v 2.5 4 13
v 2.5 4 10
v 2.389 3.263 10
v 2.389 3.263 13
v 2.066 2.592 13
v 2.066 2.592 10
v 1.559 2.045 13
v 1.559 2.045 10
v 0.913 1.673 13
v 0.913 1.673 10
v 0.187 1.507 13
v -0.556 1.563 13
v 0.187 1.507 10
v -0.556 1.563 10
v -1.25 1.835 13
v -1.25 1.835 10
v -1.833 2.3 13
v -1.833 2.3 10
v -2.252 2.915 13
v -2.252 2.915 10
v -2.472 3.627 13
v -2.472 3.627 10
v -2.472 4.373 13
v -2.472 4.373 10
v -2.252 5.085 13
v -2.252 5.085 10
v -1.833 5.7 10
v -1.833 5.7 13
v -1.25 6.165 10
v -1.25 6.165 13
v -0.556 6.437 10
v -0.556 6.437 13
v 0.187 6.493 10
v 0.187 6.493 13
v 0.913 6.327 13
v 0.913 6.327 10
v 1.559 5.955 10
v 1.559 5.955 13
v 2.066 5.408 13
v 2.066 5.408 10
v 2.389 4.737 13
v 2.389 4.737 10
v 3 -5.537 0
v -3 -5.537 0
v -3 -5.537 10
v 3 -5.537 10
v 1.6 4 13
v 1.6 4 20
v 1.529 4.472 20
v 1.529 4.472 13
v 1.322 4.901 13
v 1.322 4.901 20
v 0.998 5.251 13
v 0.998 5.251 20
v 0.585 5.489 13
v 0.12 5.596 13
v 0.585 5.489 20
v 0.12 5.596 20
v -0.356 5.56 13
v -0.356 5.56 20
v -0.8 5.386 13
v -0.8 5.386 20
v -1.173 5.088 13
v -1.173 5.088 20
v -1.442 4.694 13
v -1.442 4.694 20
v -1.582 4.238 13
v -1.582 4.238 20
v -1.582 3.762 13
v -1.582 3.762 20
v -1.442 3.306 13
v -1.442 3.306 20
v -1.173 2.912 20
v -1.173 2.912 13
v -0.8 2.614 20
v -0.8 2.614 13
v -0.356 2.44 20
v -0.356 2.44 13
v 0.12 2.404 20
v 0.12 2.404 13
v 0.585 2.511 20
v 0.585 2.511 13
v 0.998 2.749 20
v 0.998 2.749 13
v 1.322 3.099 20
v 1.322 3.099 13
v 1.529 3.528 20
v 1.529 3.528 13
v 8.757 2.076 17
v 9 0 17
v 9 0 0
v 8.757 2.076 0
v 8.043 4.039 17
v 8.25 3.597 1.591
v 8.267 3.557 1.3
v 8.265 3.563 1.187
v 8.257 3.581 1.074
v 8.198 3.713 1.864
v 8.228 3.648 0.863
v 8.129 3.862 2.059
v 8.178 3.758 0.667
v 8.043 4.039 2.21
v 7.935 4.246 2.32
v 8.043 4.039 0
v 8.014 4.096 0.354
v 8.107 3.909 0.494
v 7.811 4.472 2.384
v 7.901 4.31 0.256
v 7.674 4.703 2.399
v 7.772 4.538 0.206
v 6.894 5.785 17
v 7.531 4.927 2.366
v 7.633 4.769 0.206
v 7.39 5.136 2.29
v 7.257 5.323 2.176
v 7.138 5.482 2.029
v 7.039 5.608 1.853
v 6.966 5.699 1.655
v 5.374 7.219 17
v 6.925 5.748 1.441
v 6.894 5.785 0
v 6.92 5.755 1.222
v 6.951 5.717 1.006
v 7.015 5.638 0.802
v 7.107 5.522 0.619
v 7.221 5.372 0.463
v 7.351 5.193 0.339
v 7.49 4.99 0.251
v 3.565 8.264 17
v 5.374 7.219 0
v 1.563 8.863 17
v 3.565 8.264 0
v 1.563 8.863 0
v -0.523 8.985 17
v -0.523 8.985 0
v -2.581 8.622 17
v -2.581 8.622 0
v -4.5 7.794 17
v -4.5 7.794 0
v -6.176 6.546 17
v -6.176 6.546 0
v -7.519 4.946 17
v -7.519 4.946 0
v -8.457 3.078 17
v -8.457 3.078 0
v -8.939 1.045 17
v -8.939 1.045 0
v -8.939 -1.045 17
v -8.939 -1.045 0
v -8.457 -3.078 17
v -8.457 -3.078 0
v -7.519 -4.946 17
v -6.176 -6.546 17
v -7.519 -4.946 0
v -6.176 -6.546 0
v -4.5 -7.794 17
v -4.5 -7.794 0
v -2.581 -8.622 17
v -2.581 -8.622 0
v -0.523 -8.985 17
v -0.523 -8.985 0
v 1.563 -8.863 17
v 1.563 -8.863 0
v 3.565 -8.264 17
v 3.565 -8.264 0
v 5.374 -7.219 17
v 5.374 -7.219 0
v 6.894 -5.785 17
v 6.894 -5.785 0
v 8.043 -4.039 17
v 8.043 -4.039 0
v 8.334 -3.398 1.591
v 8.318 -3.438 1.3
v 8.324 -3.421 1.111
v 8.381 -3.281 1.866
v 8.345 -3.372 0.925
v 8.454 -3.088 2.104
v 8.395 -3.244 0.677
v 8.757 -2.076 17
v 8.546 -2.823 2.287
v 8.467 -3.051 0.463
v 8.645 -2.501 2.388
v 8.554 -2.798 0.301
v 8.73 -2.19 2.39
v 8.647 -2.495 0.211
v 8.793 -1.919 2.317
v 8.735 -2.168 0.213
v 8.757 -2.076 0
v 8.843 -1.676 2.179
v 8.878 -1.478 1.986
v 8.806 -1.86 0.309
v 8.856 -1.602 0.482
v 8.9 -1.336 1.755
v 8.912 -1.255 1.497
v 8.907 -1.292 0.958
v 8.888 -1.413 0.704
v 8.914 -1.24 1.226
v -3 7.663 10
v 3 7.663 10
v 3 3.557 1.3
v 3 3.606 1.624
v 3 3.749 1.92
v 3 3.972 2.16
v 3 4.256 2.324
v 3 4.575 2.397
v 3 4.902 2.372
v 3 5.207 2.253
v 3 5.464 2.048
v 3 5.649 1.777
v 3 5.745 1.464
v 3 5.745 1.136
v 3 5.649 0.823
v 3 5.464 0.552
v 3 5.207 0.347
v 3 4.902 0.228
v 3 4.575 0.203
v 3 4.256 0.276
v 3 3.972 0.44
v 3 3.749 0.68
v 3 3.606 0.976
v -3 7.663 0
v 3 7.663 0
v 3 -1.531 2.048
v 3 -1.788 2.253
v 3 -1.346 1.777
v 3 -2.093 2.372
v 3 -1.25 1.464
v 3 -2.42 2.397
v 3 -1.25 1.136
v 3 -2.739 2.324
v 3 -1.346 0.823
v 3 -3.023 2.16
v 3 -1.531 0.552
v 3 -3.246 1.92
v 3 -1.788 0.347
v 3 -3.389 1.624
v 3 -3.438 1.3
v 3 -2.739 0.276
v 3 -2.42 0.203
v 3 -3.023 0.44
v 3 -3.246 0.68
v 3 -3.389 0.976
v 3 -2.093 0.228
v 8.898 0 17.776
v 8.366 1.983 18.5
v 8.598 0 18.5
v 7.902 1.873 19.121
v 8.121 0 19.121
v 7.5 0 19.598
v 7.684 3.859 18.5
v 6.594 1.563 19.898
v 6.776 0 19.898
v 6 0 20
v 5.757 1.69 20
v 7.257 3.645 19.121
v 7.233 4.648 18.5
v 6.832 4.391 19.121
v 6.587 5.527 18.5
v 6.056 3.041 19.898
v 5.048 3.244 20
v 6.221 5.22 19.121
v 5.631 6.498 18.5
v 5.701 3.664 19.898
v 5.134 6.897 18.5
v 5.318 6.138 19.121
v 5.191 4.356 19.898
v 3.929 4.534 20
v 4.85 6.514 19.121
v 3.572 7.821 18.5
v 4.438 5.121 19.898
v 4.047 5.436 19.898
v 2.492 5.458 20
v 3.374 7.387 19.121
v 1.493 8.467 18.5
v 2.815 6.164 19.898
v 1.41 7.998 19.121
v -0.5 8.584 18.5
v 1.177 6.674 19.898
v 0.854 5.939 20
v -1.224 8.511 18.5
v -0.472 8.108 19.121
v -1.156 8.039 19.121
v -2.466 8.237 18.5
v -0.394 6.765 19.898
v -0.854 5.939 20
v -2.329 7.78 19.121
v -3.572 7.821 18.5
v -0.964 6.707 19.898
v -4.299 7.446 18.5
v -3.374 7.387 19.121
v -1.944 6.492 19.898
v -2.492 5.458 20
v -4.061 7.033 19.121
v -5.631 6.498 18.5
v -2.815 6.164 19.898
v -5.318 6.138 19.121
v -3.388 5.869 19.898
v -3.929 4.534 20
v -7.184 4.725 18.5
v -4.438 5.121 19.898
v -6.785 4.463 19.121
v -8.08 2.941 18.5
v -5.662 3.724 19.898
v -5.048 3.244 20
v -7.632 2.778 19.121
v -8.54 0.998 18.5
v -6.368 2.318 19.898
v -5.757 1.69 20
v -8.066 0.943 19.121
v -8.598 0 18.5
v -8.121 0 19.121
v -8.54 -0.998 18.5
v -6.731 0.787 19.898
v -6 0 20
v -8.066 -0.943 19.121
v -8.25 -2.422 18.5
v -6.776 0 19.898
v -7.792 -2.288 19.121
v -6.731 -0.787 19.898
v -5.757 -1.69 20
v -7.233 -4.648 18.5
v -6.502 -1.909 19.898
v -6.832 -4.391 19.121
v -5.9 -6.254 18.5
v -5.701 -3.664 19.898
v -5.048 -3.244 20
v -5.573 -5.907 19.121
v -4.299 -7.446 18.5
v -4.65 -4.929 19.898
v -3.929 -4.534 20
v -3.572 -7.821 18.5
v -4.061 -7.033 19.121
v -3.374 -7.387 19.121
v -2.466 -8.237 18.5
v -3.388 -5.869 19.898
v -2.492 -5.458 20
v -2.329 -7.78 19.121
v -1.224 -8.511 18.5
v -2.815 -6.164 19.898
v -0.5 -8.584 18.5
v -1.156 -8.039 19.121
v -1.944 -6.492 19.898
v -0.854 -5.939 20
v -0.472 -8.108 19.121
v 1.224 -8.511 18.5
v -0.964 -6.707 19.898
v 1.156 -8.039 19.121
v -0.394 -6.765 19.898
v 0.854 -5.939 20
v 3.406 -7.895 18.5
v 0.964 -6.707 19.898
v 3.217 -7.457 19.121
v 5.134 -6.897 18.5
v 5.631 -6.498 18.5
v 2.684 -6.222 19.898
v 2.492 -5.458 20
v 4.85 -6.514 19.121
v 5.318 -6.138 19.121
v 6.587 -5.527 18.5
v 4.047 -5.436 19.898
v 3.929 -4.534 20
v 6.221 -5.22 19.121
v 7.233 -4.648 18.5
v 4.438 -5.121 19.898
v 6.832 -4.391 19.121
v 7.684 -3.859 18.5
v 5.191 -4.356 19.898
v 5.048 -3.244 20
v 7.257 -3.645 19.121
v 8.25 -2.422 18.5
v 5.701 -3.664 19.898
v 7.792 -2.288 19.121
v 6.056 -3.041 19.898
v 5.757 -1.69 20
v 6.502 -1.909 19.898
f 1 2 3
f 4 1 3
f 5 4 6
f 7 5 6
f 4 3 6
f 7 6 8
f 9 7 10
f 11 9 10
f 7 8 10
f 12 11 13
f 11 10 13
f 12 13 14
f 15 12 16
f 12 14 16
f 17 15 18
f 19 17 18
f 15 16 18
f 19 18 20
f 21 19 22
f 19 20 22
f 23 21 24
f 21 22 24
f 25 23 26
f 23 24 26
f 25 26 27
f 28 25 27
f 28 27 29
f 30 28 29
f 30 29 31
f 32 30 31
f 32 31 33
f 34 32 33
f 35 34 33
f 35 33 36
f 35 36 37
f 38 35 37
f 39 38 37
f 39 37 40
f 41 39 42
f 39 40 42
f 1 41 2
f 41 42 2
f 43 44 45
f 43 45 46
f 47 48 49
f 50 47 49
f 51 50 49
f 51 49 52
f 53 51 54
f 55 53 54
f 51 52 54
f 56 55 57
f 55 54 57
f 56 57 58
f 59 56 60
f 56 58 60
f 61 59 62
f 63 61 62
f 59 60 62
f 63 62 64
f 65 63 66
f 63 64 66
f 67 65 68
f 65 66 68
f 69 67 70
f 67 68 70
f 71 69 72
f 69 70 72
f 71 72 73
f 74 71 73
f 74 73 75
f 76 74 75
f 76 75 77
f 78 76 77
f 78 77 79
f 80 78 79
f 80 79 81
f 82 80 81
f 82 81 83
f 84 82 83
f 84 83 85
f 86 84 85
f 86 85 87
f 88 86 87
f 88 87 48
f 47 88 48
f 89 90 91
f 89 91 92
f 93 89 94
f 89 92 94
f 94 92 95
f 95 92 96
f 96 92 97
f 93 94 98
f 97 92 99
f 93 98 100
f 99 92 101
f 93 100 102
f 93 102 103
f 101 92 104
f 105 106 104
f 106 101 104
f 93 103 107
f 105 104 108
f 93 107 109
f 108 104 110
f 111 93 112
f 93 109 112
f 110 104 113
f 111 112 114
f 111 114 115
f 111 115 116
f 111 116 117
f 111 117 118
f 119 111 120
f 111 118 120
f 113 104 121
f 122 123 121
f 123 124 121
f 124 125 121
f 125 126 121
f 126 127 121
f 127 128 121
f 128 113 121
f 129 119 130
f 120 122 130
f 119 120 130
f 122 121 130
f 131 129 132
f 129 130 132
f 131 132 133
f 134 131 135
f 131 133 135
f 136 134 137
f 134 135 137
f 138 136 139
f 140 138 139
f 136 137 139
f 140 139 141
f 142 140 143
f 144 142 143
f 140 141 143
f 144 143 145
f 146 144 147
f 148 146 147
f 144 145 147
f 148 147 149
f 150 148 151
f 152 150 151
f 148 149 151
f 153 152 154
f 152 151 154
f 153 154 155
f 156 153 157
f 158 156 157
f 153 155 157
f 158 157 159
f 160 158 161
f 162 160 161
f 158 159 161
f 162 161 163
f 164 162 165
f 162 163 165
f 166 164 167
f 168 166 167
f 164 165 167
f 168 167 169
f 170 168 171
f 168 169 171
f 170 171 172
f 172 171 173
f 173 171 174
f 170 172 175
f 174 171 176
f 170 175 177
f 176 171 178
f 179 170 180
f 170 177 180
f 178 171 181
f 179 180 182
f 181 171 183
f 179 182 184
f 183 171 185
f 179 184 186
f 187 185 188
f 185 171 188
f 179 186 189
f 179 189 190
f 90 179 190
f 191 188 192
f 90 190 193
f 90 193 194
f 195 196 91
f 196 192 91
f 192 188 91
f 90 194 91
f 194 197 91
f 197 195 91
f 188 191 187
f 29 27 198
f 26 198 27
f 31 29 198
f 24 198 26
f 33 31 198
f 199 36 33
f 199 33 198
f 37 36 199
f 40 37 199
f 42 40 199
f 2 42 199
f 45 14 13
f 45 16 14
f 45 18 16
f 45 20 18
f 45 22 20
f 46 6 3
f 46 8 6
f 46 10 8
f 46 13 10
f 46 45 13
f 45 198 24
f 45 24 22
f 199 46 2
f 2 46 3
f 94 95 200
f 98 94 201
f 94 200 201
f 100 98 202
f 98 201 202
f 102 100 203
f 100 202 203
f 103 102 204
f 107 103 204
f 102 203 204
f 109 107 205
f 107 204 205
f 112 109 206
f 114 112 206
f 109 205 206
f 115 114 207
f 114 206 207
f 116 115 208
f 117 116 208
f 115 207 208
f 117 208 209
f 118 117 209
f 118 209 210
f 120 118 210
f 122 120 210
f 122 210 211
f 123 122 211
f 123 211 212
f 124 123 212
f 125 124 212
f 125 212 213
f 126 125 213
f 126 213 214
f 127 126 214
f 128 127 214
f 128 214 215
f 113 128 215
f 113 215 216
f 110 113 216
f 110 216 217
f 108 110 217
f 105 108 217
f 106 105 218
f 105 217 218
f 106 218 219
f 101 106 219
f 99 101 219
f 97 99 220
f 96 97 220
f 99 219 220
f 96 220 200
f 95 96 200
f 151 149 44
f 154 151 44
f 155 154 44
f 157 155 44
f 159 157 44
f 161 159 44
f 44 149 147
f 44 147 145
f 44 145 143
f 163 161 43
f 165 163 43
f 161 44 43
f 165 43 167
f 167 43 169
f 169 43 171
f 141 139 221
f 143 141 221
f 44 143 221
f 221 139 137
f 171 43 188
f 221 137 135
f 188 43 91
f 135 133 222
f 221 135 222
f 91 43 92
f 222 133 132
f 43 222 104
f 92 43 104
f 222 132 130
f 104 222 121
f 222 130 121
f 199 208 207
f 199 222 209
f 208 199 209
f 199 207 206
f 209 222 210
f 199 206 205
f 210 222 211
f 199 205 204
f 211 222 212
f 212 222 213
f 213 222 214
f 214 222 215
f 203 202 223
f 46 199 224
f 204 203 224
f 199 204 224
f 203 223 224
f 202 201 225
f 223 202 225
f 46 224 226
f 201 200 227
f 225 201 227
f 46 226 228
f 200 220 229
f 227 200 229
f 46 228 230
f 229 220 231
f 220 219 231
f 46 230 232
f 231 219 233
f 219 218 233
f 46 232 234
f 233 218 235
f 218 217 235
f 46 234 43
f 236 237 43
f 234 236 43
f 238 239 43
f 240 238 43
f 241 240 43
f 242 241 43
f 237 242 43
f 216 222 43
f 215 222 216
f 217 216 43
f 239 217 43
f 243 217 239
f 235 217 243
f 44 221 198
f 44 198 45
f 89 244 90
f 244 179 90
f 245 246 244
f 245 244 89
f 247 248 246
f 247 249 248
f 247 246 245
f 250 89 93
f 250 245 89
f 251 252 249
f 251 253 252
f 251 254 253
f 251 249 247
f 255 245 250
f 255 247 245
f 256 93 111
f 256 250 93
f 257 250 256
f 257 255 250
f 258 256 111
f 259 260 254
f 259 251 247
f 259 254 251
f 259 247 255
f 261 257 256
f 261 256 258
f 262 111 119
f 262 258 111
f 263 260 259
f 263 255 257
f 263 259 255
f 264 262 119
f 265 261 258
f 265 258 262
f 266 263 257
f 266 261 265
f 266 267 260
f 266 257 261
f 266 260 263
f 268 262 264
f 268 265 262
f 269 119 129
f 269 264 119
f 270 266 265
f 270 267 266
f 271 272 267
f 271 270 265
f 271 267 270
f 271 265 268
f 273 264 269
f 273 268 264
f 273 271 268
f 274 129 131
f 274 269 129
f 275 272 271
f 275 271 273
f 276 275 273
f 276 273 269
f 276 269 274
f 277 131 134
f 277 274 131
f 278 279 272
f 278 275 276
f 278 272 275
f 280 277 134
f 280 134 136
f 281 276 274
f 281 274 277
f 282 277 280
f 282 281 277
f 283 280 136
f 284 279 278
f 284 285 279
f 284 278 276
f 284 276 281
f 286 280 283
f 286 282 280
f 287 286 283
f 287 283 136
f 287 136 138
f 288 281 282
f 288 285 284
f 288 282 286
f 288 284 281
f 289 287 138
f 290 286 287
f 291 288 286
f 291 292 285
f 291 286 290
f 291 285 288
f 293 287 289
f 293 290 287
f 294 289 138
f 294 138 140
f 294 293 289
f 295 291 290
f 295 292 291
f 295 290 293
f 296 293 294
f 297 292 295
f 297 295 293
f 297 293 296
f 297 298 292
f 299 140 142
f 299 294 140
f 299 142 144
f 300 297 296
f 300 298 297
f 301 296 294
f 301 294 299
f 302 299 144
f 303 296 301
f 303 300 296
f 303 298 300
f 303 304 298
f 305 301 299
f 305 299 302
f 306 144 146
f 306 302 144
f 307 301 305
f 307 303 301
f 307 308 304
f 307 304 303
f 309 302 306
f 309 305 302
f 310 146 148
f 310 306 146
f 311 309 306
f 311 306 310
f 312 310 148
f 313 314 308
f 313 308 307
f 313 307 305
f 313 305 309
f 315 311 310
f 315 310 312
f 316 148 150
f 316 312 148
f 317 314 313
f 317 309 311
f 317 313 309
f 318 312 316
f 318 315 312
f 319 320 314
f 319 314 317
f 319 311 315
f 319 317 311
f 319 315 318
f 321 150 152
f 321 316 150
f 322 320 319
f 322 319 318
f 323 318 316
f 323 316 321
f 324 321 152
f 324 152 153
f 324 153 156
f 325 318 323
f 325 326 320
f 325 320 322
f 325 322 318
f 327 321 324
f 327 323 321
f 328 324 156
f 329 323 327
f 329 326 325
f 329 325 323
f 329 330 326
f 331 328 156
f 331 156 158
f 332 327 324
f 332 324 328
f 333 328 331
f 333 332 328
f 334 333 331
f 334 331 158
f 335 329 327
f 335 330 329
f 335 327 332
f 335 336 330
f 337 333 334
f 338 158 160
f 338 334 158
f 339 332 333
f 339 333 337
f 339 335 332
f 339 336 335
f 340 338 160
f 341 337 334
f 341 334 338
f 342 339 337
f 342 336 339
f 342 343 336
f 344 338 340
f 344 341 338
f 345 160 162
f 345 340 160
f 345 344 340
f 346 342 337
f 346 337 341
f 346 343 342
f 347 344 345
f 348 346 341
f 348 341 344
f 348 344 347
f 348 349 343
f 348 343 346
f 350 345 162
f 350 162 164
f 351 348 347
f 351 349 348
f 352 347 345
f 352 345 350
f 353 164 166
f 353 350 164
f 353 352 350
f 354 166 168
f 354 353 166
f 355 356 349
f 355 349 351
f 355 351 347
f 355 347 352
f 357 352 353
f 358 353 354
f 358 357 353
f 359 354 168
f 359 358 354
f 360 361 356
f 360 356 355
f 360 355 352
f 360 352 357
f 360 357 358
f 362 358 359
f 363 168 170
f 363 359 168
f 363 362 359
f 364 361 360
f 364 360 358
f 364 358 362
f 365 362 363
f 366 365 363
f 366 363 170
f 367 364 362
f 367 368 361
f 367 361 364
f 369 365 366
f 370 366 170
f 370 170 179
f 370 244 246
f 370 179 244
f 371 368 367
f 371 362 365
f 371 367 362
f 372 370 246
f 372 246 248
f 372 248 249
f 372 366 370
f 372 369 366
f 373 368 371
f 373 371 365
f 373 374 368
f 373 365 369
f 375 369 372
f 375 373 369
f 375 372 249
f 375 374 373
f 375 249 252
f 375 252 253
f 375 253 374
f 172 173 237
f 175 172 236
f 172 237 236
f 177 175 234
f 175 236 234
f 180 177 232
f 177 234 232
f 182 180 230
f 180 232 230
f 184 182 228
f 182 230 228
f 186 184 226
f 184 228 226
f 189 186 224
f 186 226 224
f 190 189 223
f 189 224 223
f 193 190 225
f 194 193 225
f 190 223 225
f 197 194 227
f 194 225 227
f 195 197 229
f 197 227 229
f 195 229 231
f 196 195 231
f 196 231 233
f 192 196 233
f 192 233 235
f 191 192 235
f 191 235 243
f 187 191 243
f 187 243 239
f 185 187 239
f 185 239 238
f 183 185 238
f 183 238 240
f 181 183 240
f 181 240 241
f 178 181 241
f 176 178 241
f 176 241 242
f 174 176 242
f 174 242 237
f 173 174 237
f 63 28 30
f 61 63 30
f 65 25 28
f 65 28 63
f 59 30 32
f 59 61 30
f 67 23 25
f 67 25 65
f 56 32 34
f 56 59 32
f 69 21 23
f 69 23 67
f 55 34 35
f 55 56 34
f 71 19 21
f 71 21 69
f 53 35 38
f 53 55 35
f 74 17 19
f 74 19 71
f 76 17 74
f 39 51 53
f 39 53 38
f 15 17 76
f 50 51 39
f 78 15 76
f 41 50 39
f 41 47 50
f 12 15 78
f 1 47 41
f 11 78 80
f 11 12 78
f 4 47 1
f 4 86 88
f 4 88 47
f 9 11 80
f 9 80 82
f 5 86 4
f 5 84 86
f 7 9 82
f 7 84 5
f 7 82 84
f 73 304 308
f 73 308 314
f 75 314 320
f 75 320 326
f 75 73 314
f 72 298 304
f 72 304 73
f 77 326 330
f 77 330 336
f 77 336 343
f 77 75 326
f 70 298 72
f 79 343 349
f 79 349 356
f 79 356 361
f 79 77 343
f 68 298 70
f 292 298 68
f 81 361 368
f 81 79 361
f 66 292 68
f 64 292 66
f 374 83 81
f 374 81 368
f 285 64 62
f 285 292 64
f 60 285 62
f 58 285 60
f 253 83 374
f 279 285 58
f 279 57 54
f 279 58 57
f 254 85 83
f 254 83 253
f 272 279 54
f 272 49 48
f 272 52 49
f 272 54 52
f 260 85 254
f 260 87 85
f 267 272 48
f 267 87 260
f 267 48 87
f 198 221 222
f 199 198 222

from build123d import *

# Parameters (mm, degrees)
SKETCH_R        = 9
PAD_DEPTH       = 20
SKETCH001_W     = 6
SKETCH001_H     = 13.2
POCKET_DEPTH    = 10
SKETCH002_R     = 1.6
POCKET001_DEPTH = 11
FILLET_R        = 3
SKETCH003_R     = 2.5
POCKET002_DEPTH = 3
SKETCH004_R     = 1.1
POCKET003_DEPTH = 13


with BuildPart() as part:
    # Sketch → Pad (new body)
    with BuildSketch(Plane.XY):
        Circle(SKETCH_R)
    extrude(amount=PAD_DEPTH)

    # Sketch001 (on Face2 of Pad) → Pocket (cut)
    with BuildSketch(Plane(origin=(0, 0, 0), x_dir=(1, 0, 0), z_dir=(0, 0, -1))):
        with Locations((0, -1.063468)):
            Rectangle(SKETCH001_W, SKETCH001_H)
    extrude(amount=-POCKET_DEPTH, mode=Mode.SUBTRACT)

    # Sketch002 (on Face3 of Pocket) → Pocket001 (cut)
    with BuildSketch(Plane.XY.offset(20)):
        with Locations((0, 4)):
            Circle(SKETCH002_R)
    extrude(amount=-POCKET001_DEPTH, mode=Mode.SUBTRACT)

    # Fillet
    fillet_edges = [part.edges().sort_by_distance(p)[0] for p in [
        (-9, 0, 20),
    ]]
    fillet(fillet_edges, radius=FILLET_R)

    # Sketch003 (on Face10 of Fillet) → Pocket002 (cut)
    with BuildSketch(Plane(origin=(0, 0, 10), x_dir=(1, 0, 0), z_dir=(0, 0, -1))):
        with Locations((0, -4)):
            Circle(SKETCH003_R)
    extrude(amount=-POCKET002_DEPTH, mode=Mode.SUBTRACT)

    # Sketch004 (on Face6 of Pocket002) → Pocket003 (cut)
    with BuildSketch(Plane(origin=(3, 0, 0), x_dir=(0, -1, 0), z_dir=(-1, 0, 0))):
        with Locations((2.337519, 1.3)):
            Circle(SKETCH004_R)
        with Locations((-4.657478, 1.3)):
            Circle(SKETCH004_R)
    extrude(amount=-POCKET003_DEPTH, mode=Mode.SUBTRACT)


solid = part.part
